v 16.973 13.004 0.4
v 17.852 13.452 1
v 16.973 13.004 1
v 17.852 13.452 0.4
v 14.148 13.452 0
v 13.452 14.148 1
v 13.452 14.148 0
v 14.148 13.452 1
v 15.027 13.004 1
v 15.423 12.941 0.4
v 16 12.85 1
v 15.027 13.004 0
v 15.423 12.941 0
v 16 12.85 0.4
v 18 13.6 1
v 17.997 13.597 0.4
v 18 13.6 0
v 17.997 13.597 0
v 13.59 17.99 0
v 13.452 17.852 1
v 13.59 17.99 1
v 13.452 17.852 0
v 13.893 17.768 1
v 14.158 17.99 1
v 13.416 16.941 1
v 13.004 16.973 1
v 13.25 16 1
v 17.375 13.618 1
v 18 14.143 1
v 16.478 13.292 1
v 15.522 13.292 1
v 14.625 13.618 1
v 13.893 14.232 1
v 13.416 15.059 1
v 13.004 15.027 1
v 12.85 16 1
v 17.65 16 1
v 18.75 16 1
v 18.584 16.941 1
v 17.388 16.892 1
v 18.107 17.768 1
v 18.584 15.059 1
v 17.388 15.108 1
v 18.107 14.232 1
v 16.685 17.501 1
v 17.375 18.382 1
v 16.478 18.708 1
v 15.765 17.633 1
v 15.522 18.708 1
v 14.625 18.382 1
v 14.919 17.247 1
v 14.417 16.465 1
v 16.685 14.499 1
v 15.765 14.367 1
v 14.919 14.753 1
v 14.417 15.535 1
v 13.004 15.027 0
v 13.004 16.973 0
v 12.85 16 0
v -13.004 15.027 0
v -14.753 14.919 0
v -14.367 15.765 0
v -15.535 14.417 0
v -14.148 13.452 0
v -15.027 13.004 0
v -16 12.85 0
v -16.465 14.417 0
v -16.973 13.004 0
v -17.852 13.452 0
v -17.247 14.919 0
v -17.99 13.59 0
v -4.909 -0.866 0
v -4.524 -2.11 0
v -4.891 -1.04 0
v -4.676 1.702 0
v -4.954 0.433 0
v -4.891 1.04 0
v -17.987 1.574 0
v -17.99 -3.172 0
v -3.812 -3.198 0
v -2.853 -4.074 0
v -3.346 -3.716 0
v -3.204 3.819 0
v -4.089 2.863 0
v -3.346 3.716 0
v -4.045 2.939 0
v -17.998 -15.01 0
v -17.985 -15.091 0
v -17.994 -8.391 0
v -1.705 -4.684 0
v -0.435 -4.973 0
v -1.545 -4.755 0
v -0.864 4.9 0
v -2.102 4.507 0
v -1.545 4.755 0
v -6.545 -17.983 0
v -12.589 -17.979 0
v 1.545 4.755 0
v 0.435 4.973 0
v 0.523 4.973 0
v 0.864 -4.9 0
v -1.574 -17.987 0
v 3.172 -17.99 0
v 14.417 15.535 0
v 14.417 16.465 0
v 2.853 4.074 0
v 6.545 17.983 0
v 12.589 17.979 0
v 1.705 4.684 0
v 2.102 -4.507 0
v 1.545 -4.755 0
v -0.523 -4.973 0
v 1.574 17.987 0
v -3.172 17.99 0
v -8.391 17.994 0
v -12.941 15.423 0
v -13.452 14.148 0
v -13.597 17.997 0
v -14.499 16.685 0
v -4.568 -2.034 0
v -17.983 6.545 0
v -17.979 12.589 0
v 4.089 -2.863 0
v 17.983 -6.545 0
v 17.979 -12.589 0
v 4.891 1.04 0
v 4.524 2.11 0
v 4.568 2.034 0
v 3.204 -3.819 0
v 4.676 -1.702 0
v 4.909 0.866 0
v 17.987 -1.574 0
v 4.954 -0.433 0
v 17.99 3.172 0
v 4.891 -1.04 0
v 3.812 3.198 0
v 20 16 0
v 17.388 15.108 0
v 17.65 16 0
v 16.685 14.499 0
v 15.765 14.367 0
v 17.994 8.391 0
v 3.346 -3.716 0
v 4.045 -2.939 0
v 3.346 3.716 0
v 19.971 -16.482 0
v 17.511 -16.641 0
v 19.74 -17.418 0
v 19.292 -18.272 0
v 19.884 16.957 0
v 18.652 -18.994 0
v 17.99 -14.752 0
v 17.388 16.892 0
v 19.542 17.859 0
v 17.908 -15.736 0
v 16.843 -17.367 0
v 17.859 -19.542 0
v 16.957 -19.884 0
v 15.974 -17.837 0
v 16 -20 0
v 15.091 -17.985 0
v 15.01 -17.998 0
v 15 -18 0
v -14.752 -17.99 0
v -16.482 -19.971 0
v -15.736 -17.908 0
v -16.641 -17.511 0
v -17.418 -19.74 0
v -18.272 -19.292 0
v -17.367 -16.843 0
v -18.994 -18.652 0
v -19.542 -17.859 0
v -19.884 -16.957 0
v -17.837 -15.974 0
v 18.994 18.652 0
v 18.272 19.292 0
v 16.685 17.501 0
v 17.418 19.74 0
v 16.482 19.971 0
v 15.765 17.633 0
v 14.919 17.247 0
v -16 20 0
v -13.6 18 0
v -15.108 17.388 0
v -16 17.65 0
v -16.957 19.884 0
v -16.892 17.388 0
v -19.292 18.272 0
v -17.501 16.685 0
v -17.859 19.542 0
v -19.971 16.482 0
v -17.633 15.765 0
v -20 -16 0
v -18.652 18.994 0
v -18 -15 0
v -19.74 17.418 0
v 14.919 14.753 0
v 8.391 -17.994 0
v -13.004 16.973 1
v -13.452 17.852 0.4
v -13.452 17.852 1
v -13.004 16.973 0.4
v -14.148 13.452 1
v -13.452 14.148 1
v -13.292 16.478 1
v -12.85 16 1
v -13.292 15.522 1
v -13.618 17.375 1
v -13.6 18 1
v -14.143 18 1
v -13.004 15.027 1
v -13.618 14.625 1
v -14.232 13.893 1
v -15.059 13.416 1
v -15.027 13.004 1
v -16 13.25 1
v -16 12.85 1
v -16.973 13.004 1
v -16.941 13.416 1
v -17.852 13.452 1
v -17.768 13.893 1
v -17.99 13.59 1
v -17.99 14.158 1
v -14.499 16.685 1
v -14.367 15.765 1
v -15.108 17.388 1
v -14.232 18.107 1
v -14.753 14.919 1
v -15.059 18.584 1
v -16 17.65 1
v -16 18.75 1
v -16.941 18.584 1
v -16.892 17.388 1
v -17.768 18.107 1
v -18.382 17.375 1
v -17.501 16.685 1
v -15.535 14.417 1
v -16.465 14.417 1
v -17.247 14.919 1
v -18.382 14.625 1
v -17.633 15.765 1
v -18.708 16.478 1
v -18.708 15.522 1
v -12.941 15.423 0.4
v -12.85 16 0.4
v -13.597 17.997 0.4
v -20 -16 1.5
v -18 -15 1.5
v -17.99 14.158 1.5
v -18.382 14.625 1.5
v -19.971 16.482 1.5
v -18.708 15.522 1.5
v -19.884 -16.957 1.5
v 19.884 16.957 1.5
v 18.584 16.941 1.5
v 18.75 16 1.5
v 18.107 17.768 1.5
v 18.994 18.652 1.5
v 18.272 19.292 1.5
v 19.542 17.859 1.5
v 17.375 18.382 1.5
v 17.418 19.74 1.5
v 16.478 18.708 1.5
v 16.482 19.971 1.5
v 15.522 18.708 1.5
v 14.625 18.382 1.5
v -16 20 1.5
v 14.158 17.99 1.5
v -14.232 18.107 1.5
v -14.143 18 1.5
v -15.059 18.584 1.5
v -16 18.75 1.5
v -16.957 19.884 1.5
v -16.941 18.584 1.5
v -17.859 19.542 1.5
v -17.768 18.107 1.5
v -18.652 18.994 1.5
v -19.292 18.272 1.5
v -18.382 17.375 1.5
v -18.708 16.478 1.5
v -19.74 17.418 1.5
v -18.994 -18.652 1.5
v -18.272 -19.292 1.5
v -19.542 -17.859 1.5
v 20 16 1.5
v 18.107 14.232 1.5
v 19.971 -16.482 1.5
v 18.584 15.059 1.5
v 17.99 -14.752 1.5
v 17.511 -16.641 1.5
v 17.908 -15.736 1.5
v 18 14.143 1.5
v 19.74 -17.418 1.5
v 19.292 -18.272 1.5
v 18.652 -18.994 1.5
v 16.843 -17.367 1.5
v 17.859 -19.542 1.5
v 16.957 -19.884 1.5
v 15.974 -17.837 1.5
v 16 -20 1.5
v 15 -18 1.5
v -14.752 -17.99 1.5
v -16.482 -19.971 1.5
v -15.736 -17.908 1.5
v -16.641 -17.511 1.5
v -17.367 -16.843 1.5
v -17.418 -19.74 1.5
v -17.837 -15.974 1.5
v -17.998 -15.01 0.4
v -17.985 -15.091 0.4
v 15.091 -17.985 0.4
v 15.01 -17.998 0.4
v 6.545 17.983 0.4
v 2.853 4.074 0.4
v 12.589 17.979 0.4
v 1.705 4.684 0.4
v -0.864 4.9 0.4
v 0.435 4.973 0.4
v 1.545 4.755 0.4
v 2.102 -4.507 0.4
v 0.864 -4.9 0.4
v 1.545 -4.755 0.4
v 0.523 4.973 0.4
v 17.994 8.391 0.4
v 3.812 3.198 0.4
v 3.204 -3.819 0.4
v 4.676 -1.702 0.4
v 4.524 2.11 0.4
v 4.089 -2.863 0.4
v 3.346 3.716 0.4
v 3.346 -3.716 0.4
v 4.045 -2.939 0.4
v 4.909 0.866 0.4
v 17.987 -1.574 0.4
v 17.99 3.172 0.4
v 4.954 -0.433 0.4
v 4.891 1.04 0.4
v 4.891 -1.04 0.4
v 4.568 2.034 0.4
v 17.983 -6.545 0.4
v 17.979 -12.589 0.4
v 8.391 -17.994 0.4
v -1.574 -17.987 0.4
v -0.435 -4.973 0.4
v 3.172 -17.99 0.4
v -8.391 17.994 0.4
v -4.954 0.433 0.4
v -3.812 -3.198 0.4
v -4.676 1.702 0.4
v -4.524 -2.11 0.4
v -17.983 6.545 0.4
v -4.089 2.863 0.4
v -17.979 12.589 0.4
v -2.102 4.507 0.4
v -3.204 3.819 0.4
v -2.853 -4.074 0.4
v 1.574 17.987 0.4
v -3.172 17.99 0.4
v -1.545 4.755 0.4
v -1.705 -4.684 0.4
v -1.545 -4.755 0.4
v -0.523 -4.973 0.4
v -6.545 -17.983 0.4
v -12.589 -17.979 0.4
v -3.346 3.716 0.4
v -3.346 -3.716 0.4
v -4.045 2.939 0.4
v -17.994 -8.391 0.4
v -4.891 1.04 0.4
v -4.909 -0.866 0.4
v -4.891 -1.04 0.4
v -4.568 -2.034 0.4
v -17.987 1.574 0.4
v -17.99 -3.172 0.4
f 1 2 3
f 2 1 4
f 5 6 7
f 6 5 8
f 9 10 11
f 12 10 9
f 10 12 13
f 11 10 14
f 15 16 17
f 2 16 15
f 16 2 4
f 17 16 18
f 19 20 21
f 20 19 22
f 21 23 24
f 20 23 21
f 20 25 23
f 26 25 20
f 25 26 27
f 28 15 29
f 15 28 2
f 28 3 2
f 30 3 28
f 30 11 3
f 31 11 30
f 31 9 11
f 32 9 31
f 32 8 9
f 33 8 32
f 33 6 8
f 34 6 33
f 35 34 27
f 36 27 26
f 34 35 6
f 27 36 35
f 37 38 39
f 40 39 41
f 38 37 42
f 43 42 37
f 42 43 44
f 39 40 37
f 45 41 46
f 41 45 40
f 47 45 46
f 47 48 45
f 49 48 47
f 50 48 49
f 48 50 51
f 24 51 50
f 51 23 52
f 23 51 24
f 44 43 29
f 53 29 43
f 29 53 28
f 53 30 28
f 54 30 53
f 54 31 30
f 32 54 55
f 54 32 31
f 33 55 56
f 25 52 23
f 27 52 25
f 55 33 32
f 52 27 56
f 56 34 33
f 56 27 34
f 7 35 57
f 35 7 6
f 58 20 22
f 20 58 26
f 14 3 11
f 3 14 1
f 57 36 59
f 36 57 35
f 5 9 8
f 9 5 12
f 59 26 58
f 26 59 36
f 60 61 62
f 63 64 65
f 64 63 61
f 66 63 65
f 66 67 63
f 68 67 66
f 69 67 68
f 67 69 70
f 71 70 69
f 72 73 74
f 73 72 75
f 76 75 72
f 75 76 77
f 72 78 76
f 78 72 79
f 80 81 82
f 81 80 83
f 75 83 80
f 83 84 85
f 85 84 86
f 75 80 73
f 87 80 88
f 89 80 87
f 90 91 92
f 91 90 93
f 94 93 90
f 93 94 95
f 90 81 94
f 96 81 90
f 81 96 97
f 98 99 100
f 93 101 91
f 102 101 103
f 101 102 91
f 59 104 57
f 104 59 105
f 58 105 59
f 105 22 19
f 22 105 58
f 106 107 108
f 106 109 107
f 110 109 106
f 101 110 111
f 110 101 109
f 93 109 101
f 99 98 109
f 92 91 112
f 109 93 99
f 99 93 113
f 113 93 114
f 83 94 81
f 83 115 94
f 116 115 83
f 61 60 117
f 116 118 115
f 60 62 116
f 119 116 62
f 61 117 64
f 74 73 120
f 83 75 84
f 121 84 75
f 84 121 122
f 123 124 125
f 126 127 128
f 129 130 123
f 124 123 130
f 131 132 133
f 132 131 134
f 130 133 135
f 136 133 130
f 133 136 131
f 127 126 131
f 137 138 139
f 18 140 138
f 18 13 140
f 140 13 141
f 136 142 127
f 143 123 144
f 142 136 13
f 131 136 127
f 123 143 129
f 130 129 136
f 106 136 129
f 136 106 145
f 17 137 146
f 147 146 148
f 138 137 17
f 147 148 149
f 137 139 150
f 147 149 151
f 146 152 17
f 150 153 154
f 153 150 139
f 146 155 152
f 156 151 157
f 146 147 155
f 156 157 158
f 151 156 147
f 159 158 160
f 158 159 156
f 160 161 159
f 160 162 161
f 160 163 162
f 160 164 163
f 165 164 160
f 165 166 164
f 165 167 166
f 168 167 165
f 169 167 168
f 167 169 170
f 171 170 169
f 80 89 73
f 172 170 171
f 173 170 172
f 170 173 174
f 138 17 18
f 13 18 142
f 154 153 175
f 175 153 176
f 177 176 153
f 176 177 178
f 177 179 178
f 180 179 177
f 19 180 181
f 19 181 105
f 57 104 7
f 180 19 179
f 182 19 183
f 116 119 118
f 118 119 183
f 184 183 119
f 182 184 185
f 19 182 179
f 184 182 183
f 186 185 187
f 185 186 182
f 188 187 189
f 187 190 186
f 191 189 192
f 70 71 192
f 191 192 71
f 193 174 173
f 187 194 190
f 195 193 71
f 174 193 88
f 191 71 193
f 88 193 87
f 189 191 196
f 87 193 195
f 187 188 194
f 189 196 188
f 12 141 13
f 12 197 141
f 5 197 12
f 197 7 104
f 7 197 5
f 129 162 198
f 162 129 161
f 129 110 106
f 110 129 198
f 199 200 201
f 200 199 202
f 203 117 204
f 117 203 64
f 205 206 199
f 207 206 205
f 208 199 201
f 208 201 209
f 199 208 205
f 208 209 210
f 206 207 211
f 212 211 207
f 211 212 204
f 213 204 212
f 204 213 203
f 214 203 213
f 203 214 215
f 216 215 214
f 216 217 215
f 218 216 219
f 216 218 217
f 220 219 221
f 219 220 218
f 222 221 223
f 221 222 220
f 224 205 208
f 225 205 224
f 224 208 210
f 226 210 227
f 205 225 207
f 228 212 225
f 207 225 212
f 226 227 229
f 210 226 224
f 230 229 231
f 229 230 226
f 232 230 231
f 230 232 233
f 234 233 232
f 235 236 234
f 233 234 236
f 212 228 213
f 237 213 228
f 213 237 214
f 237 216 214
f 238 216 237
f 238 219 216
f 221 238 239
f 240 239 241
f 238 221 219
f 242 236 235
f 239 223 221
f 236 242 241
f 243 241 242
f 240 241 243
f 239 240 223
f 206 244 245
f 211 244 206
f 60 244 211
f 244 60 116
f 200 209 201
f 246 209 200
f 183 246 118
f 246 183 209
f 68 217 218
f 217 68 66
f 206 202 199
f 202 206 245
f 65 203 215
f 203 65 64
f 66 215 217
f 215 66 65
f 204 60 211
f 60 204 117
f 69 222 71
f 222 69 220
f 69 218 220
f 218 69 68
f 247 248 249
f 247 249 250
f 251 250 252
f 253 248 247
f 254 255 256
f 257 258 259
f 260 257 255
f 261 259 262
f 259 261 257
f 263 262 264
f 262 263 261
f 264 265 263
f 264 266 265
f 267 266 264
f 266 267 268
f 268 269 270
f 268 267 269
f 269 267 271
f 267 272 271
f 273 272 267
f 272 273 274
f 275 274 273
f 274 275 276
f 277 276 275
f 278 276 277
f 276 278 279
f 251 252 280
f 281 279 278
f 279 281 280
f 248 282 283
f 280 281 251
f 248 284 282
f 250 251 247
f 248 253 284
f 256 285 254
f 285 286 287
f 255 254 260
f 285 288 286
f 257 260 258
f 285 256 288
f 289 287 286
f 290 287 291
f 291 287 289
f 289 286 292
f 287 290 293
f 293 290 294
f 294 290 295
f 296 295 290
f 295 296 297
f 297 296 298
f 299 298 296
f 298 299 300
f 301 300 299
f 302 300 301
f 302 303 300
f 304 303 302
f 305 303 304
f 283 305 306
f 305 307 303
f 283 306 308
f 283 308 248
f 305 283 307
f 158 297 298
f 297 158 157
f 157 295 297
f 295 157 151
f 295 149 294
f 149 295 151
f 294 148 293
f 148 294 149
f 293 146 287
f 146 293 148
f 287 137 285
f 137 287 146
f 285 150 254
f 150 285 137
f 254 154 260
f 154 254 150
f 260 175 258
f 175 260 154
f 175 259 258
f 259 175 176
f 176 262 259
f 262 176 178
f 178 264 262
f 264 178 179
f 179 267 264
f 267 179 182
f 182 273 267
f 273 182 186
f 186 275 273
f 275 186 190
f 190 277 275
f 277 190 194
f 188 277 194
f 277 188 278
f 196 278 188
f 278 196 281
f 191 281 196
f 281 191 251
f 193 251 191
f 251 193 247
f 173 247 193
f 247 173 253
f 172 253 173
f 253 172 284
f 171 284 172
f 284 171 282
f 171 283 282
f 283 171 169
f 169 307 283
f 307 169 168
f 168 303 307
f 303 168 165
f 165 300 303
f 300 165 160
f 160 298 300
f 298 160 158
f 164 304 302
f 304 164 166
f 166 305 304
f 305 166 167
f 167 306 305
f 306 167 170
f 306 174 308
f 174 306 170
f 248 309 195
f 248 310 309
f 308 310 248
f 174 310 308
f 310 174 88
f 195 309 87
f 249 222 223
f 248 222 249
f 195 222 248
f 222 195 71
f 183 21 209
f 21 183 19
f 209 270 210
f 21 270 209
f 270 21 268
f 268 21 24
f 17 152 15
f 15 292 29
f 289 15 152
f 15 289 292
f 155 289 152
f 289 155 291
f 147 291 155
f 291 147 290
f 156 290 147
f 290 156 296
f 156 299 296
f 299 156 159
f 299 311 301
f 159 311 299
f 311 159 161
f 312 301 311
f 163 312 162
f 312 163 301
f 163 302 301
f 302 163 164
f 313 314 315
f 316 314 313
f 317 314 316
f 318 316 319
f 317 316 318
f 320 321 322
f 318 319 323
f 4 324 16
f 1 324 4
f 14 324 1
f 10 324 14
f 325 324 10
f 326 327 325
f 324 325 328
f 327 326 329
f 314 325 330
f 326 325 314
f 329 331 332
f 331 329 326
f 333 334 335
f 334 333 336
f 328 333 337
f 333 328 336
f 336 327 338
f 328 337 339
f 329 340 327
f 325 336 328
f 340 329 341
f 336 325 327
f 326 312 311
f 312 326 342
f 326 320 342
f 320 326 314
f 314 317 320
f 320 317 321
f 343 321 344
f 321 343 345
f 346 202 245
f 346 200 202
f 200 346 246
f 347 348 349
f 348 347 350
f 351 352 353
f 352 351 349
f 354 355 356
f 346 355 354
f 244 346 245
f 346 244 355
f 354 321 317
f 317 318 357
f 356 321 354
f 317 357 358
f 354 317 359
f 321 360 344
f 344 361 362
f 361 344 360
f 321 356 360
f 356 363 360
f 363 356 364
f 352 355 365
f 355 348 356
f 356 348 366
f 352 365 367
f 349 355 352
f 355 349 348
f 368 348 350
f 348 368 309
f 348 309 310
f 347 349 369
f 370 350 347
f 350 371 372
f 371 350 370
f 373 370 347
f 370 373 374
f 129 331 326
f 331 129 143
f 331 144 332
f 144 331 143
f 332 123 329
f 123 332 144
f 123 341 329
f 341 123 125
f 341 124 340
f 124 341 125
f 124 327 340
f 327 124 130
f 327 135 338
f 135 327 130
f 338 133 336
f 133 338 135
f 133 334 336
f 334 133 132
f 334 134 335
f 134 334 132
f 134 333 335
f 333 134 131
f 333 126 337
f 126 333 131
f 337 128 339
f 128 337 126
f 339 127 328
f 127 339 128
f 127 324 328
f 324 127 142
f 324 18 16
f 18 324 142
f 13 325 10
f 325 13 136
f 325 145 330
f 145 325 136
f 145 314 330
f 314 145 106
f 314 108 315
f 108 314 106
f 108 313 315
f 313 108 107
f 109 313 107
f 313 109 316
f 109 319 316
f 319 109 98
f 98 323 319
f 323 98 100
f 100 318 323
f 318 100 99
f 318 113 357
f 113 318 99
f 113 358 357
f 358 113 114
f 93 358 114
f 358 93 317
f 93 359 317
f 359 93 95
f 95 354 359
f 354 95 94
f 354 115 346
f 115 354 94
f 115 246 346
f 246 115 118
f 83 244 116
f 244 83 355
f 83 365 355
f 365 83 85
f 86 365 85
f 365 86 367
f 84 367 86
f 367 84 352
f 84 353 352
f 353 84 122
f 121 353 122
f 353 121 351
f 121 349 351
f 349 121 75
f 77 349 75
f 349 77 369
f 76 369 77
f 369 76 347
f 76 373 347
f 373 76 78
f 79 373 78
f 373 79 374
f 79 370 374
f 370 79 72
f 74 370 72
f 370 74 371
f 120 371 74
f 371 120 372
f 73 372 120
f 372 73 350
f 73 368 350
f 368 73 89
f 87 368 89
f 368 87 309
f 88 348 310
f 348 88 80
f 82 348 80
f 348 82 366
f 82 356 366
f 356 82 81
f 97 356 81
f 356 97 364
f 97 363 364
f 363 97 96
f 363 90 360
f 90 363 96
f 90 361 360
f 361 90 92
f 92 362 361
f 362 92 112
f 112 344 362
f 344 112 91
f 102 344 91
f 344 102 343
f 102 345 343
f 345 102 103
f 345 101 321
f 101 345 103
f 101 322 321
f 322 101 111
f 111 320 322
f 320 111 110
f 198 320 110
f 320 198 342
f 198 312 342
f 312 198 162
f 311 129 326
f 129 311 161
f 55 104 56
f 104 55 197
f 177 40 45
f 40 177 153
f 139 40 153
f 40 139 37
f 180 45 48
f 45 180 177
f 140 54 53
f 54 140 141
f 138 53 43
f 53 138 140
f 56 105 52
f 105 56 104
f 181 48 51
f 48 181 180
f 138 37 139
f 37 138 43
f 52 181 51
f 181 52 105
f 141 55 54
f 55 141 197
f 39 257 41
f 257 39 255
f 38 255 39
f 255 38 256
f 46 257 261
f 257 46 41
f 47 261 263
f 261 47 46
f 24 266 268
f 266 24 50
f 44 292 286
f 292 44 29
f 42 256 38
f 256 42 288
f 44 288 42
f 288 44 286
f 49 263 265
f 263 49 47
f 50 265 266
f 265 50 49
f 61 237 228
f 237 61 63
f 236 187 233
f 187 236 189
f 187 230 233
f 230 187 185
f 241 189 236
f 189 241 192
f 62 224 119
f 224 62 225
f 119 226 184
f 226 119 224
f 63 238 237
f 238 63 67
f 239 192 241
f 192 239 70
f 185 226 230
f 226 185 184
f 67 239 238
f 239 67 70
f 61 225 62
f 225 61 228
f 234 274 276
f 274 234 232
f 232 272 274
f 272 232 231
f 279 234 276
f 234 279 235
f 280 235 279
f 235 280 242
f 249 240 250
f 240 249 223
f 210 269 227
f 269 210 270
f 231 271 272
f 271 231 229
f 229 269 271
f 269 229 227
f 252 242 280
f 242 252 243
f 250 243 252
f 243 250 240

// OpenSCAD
hullHeight = 1.5;

$fs = 1;

module smoothSquare(size = 20, filletSize = 4) {
	hull() {
		for(i=[0:90:360]) rotate([0, 0, i]) translate([size - filletSize, size - filletSize]) circle(r = filletSize);
	}
}

module mountHoles() {
	difference() {
		union() {
			for(i=[0:90:90]) rotate([0, 0, i]) translate([16, 16, 0]) cylinder(d = 3.3 + 1.5 * 2, h = 1);
			children();
		}
		
		for(i=[0:90:90]) rotate([0, 0, i]) translate([16, 16, 0]) {
			cylinder(d = 3.3, h = 5);
			translate([0, 0, 1]) cylinder(d = 5.5, h = 5);
		}
	}
}
		

module carryHull() {
	linear_extrude(height = hullHeight, convexity = 3) difference() {
		smoothSquare(20, 4); 
		smoothSquare(18, 3);
	}
}

module slice(angle = 10) {
	polygon([[0, 0], [100, 0], [100, tan(angle) * 100]]);
}

module airBlocker() {
	
	block = 0.5;
	
	linear_extrude(height = 0.40, convexity = 2) {
		difference() {
				smoothSquare(18, 0.5);
				
			
			for(i=[0:12]) rotate([0, 0, 360/12 * i - 20]) slice(angle = 360/12 * block);
			}
			
			circle(r = 5);
	}
}

mountHoles()
union() {
	carryHull();
	airBlocker();
}
